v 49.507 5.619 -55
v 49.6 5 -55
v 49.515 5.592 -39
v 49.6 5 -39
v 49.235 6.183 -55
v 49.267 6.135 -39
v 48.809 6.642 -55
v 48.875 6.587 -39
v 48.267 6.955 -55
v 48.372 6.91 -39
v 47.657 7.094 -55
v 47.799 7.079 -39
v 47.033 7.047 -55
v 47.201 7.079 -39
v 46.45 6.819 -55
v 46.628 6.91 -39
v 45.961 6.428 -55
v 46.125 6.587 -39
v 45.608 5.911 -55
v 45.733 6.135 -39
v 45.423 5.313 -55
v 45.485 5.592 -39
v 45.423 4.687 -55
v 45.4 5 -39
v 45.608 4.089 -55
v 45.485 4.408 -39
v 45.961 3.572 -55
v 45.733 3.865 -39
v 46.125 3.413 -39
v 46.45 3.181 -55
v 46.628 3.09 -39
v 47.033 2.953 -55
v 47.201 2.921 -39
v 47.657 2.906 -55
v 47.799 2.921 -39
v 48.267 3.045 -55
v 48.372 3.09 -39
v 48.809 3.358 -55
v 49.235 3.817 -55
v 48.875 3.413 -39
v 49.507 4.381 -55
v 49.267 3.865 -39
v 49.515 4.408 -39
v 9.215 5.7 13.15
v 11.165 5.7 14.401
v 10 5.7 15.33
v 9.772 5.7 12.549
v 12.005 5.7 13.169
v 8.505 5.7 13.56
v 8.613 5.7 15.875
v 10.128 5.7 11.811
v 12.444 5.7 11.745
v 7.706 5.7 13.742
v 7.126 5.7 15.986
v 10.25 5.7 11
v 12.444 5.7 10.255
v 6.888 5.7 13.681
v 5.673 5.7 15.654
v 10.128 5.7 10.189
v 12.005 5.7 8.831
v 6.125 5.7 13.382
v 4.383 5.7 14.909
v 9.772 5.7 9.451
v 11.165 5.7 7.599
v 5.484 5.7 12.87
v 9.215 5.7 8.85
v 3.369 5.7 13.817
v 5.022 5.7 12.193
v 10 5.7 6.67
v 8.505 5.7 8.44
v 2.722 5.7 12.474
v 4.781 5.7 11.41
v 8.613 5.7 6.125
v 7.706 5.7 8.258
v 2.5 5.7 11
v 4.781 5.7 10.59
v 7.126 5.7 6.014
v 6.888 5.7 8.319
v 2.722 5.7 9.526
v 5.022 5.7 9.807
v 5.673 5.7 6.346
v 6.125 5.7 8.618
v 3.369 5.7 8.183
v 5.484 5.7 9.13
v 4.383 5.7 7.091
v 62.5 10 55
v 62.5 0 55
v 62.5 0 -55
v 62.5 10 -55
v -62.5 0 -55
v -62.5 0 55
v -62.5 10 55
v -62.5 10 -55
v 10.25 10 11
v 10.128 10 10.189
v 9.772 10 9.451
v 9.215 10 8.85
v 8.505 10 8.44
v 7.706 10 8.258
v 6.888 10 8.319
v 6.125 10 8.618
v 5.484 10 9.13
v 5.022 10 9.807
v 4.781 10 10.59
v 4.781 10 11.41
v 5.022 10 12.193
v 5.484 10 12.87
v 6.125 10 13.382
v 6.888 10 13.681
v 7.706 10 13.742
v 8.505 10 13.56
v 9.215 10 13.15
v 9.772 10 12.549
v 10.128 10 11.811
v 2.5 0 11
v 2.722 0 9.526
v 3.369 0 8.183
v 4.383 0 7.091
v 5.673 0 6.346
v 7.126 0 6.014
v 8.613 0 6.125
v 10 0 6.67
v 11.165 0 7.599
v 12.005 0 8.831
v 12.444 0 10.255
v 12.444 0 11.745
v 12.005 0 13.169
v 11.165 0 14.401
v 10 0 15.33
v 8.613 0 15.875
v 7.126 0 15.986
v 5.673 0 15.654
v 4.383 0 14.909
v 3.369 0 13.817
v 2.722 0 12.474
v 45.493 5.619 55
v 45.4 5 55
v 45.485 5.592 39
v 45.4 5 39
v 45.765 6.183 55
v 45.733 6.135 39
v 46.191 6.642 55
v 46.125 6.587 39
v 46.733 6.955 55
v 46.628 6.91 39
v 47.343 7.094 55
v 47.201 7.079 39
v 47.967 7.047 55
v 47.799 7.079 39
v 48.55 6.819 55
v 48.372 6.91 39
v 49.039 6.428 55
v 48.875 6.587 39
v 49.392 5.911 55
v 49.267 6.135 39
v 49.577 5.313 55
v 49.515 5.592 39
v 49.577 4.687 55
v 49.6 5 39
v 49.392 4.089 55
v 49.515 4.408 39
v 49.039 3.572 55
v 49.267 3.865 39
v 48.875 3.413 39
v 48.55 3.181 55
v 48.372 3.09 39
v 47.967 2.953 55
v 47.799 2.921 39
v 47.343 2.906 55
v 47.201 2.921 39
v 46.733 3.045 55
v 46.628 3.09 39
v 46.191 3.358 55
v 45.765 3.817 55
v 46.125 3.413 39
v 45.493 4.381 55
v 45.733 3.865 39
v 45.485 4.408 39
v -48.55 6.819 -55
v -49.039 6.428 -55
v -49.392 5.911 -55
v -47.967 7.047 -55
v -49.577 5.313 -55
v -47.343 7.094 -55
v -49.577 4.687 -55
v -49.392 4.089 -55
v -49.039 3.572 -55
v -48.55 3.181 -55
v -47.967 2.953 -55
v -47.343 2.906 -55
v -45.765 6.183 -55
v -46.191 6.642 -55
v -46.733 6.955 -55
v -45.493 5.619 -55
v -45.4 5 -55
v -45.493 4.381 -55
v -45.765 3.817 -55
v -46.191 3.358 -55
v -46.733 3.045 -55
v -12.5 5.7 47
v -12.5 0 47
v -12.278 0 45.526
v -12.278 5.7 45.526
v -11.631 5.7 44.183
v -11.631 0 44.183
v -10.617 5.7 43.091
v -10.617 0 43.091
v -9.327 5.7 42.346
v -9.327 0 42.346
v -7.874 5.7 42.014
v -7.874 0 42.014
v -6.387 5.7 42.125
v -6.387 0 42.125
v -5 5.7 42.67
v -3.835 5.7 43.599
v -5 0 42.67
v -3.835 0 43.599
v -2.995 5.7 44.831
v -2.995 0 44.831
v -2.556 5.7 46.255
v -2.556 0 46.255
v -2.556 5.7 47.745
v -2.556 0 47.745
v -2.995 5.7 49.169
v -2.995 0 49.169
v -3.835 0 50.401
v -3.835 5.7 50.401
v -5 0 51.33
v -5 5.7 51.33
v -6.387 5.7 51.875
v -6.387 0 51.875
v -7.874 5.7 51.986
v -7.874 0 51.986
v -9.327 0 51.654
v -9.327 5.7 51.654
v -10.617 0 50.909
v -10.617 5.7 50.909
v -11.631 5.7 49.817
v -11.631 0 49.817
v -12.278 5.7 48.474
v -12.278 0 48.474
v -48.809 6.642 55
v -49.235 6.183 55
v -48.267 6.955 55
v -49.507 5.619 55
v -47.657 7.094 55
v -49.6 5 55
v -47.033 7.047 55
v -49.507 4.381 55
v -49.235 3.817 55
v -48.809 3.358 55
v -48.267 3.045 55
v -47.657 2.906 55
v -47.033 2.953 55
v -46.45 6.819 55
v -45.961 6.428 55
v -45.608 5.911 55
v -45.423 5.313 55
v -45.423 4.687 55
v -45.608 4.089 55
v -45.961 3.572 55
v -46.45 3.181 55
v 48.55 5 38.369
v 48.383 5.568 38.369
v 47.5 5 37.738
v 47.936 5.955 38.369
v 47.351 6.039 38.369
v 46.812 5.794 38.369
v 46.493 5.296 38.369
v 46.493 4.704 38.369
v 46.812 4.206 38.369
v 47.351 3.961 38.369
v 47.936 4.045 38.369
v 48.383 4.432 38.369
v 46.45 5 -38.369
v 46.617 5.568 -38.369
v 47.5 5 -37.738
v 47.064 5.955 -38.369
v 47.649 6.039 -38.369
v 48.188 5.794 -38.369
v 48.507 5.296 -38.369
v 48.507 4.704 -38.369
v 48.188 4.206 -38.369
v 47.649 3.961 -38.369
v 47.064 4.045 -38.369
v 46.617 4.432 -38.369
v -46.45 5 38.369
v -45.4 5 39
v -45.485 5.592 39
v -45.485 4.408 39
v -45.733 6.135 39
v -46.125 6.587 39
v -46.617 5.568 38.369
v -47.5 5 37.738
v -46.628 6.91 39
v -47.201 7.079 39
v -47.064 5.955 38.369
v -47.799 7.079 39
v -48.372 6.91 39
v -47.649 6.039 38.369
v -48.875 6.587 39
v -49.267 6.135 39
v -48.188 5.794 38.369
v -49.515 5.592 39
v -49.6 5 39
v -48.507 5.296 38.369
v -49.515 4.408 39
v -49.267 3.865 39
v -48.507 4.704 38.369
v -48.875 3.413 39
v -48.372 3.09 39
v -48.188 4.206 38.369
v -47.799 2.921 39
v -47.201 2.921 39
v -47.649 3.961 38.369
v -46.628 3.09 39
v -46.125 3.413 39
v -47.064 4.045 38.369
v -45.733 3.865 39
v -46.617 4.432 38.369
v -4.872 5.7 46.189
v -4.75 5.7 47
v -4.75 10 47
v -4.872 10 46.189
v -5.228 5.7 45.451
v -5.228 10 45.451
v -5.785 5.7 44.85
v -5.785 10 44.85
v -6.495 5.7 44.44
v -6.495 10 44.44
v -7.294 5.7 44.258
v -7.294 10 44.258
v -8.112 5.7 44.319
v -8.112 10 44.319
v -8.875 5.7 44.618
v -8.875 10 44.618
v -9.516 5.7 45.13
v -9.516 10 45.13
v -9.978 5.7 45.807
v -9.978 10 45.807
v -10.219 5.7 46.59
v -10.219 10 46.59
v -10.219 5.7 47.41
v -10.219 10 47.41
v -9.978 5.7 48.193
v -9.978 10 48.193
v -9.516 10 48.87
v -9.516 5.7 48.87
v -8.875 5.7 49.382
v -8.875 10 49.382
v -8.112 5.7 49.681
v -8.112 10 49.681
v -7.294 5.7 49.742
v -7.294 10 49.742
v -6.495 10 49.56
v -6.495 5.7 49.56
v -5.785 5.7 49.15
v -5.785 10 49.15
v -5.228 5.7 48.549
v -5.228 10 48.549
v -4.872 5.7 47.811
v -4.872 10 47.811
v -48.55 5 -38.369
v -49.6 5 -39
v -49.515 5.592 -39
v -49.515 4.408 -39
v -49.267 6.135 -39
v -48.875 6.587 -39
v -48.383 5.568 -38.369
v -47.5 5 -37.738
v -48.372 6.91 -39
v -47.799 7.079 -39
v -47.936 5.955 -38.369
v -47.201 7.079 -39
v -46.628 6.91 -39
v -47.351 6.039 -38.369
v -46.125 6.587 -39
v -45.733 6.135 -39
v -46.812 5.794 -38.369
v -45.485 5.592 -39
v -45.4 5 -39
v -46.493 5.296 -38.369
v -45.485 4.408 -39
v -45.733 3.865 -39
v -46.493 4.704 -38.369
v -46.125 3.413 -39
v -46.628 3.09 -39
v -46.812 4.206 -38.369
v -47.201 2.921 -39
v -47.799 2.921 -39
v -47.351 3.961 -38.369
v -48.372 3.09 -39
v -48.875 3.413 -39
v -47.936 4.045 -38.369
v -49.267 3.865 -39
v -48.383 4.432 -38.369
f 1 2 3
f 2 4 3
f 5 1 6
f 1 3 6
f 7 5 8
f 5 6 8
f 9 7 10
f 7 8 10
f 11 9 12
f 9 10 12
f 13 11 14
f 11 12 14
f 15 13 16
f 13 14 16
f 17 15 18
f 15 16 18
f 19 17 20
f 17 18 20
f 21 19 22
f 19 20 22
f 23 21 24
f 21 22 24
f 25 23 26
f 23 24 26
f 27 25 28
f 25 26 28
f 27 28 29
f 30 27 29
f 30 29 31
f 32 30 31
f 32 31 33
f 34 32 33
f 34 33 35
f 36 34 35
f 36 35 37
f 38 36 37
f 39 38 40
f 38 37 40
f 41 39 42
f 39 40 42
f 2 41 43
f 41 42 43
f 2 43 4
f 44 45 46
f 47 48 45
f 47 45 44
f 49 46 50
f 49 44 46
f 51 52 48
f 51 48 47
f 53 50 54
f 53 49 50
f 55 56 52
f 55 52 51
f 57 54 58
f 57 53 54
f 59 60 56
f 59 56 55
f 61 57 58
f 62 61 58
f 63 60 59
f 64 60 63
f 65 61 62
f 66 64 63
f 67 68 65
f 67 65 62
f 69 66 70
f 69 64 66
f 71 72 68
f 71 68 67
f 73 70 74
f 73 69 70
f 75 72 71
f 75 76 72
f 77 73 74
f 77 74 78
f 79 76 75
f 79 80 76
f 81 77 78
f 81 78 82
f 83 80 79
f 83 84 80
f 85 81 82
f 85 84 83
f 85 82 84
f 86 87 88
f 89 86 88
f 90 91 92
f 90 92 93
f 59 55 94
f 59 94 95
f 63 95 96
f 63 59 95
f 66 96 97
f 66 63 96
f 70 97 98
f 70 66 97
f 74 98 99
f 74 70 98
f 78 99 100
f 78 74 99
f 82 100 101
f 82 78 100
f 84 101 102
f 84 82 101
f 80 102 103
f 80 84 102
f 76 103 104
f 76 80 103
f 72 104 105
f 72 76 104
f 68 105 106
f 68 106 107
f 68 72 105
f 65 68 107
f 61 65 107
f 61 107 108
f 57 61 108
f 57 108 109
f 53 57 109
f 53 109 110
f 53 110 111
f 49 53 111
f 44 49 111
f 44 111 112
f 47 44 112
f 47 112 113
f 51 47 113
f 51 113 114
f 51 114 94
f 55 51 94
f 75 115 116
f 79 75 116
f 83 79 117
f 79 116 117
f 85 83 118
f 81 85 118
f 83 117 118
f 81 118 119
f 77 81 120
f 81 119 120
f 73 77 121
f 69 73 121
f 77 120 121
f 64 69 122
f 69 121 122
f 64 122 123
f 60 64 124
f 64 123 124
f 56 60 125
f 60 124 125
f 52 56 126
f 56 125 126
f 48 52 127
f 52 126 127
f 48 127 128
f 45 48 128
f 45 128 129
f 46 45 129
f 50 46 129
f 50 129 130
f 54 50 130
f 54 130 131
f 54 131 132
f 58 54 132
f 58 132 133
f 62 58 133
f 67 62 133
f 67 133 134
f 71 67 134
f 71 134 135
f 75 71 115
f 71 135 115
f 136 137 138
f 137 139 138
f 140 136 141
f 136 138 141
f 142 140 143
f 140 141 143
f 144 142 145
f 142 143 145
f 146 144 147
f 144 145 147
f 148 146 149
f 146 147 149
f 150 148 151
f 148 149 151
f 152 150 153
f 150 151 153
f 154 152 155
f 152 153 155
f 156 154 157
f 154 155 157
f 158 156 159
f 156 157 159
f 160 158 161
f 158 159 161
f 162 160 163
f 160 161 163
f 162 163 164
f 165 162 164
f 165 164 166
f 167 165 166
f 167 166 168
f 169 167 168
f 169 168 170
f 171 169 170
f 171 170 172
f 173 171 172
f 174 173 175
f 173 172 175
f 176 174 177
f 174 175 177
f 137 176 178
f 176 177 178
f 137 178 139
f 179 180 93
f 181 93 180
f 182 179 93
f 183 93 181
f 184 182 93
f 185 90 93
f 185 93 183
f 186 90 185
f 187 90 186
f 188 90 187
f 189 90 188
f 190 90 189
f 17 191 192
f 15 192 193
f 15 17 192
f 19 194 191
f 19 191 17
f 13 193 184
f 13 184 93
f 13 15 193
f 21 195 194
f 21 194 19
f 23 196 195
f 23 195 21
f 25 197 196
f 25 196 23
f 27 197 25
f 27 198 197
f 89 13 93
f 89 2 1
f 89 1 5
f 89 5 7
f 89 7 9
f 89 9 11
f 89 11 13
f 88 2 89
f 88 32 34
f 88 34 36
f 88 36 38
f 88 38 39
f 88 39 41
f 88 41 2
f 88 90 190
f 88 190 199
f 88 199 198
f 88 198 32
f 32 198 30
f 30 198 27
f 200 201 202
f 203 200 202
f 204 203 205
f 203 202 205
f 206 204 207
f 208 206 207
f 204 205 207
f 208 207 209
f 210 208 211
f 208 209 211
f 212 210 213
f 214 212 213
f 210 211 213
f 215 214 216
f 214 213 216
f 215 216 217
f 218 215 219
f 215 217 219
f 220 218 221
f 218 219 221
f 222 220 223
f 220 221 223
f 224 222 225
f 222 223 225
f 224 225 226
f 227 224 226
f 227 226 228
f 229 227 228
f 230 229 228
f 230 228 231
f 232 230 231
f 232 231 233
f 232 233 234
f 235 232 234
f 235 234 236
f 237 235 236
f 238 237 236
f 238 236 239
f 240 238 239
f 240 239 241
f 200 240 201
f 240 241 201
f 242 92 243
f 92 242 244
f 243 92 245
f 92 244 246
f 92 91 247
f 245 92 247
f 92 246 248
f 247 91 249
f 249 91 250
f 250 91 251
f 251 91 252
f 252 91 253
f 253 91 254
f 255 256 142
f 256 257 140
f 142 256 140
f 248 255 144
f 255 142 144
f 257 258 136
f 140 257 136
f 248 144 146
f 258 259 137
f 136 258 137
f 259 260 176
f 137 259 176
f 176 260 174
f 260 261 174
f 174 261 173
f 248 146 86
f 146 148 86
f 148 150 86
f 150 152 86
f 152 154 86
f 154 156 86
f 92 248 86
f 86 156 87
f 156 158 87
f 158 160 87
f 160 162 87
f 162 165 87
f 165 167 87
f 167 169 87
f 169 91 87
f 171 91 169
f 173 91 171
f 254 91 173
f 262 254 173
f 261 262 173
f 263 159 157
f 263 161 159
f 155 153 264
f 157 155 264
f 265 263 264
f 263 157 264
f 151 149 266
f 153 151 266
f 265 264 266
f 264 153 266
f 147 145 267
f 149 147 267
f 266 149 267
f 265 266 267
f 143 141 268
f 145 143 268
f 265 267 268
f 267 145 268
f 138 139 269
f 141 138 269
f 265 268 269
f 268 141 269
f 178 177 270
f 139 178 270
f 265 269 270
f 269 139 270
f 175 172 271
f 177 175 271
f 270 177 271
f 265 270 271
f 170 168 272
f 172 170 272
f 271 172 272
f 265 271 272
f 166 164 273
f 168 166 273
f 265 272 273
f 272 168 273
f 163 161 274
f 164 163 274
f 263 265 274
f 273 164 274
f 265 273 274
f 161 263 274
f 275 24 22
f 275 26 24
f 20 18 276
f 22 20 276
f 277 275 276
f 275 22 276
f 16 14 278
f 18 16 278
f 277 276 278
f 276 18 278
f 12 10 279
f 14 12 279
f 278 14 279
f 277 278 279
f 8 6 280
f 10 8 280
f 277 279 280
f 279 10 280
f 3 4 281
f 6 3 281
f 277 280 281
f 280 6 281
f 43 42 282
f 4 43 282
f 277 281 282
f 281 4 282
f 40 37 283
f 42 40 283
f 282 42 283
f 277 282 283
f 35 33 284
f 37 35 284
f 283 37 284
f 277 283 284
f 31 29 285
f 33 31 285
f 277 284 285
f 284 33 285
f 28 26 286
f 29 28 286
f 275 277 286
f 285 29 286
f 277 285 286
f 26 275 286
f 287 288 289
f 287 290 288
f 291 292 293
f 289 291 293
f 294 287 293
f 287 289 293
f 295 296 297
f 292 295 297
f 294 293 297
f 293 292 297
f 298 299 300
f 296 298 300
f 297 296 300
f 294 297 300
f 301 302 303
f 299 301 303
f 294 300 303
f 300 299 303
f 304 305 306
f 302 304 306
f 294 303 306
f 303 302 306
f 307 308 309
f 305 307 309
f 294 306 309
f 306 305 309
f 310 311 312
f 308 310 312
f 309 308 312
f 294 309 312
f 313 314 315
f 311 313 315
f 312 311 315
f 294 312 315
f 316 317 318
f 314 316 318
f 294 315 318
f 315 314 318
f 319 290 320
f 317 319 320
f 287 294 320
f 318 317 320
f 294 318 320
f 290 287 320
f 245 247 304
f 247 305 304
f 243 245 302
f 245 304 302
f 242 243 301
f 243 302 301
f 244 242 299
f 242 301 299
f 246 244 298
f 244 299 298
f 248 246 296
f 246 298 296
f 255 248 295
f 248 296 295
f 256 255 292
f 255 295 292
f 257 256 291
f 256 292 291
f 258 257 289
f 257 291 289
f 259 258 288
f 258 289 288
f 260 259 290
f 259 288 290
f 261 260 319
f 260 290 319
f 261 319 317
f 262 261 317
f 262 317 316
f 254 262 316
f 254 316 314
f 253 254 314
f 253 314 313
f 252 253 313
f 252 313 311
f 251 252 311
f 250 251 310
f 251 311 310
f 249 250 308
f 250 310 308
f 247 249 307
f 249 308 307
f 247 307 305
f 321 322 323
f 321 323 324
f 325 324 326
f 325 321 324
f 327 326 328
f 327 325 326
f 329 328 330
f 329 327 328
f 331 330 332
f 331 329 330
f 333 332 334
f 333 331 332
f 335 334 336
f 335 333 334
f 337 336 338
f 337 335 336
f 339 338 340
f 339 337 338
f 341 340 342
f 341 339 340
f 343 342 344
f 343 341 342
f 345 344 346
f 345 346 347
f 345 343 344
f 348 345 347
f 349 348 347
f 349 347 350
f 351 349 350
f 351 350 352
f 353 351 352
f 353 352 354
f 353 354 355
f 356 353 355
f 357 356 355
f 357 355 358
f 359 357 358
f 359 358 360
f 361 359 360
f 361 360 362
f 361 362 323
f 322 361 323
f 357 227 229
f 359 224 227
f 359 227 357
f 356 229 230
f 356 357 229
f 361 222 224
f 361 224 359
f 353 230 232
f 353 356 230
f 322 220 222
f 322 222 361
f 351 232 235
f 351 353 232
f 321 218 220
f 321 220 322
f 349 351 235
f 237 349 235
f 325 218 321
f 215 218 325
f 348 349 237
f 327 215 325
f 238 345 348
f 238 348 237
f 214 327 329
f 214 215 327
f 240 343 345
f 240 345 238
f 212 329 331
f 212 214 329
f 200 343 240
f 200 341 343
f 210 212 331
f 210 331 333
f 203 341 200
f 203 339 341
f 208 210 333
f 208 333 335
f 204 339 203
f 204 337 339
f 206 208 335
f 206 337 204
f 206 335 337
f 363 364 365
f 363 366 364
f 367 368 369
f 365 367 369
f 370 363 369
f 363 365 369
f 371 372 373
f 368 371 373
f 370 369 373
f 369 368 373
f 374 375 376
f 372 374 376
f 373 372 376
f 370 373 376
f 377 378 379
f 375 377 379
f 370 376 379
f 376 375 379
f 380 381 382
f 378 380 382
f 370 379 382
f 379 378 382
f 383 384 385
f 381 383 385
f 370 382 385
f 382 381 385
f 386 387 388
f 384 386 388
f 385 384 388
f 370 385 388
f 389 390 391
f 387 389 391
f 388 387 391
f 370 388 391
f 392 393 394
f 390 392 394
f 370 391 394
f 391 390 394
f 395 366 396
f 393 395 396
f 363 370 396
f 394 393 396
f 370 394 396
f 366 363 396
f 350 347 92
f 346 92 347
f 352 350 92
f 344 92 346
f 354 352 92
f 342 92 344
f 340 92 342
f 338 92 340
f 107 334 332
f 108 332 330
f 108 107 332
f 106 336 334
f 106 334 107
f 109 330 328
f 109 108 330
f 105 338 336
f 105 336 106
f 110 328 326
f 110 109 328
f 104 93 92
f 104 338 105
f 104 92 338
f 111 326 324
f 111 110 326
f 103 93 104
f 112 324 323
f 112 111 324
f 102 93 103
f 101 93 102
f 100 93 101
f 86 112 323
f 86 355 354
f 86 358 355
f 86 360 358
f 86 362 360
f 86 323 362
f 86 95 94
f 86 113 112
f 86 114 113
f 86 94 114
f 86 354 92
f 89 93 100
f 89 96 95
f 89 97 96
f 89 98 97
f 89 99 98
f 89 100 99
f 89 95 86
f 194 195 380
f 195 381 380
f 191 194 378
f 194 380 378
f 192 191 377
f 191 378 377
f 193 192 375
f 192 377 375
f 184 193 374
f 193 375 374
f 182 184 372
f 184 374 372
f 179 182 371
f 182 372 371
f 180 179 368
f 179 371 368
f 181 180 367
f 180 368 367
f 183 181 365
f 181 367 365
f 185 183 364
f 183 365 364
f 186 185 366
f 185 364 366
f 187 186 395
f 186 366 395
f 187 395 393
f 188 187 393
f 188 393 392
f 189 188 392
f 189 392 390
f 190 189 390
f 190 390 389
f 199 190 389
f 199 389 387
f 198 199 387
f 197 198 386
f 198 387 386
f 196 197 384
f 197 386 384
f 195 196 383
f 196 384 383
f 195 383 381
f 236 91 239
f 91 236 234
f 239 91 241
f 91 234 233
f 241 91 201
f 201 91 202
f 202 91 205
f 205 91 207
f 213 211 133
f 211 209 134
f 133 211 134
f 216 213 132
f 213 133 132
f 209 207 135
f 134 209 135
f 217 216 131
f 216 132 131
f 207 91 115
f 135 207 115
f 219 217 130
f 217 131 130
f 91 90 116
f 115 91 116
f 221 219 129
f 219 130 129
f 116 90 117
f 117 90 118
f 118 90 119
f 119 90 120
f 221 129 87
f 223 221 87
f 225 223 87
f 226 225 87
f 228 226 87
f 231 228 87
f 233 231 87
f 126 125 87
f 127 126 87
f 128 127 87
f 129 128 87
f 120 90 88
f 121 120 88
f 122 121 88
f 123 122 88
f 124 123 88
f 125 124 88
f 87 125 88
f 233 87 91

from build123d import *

# Parameters (mm, degrees)
SKETCH1_W             = 125
SKETCH1_H             = 110
SKETCH1_R             = 2.75
BOSS_EXTRUDE1_DEPTH   = 10
M5_TAPPED_HOLE3_D     = 4.2
M5_TAPPED_HOLE3_DEPTH = 16
M5_TAPPED_HOLE3_TIP   = 1.2618073
M5_TAPPED_HOLE4_D     = 4.2
M5_TAPPED_HOLE4_DEPTH = 16
M5_TAPPED_HOLE4_TIP   = 1.2618073
SKETCH13_R            = 5
CUT_EXTRUDE1_DEPTH    = 5.7


with BuildPart() as part:
    # Sketch1 → Boss-Extrude1 (new body)
    with BuildSketch(Plane(origin=(0, 0, 0), x_dir=(1, 0, 0), z_dir=(0, 1, 0))):
        Rectangle(SKETCH1_W, SKETCH1_H)
        with Locations((7.5, -11)):
            Circle(SKETCH1_R, mode=Mode.SUBTRACT)
        with Locations((-7.5, -47)):
            Circle(SKETCH1_R, mode=Mode.SUBTRACT)
    extrude(amount=BOSS_EXTRUDE1_DEPTH)

    # M5 Tapped Hole3
    with Locations(Plane(origin=(0, 0, -55), x_dir=(-1, 0, 0), z_dir=(0, 0, -1))):
        with Locations((-47.5, 5), (47.5, 5)):
            Hole(M5_TAPPED_HOLE3_D / 2, depth=M5_TAPPED_HOLE3_DEPTH)
            with Locations((0, 0, -(M5_TAPPED_HOLE3_DEPTH + M5_TAPPED_HOLE3_TIP / 2))):  # 118° drill point
                Cone(0, M5_TAPPED_HOLE3_D / 2, M5_TAPPED_HOLE3_TIP, mode=Mode.SUBTRACT)

    # M5 Tapped Hole4
    with Locations(Plane.XY.offset(55)):
        with Locations((-47.5, 5), (47.5, 5)):
            Hole(M5_TAPPED_HOLE4_D / 2, depth=M5_TAPPED_HOLE4_DEPTH)
            with Locations((0, 0, -(M5_TAPPED_HOLE4_DEPTH + M5_TAPPED_HOLE4_TIP / 2))):  # 118° drill point
                Cone(0, M5_TAPPED_HOLE4_D / 2, M5_TAPPED_HOLE4_TIP, mode=Mode.SUBTRACT)

    # Sketch13 → Cut-Extrude1 (cut)
    with BuildSketch(Plane(origin=(0, 0, 0), x_dir=(-1, 0, 0), z_dir=(0, -1, 0))):
        with Locations((-7.5, -11)):
            Circle(SKETCH13_R)
        with Locations((7.5, -47)):
            Circle(SKETCH13_R)
    extrude(amount=-CUT_EXTRUDE1_DEPTH, mode=Mode.SUBTRACT)


solid = part.part
